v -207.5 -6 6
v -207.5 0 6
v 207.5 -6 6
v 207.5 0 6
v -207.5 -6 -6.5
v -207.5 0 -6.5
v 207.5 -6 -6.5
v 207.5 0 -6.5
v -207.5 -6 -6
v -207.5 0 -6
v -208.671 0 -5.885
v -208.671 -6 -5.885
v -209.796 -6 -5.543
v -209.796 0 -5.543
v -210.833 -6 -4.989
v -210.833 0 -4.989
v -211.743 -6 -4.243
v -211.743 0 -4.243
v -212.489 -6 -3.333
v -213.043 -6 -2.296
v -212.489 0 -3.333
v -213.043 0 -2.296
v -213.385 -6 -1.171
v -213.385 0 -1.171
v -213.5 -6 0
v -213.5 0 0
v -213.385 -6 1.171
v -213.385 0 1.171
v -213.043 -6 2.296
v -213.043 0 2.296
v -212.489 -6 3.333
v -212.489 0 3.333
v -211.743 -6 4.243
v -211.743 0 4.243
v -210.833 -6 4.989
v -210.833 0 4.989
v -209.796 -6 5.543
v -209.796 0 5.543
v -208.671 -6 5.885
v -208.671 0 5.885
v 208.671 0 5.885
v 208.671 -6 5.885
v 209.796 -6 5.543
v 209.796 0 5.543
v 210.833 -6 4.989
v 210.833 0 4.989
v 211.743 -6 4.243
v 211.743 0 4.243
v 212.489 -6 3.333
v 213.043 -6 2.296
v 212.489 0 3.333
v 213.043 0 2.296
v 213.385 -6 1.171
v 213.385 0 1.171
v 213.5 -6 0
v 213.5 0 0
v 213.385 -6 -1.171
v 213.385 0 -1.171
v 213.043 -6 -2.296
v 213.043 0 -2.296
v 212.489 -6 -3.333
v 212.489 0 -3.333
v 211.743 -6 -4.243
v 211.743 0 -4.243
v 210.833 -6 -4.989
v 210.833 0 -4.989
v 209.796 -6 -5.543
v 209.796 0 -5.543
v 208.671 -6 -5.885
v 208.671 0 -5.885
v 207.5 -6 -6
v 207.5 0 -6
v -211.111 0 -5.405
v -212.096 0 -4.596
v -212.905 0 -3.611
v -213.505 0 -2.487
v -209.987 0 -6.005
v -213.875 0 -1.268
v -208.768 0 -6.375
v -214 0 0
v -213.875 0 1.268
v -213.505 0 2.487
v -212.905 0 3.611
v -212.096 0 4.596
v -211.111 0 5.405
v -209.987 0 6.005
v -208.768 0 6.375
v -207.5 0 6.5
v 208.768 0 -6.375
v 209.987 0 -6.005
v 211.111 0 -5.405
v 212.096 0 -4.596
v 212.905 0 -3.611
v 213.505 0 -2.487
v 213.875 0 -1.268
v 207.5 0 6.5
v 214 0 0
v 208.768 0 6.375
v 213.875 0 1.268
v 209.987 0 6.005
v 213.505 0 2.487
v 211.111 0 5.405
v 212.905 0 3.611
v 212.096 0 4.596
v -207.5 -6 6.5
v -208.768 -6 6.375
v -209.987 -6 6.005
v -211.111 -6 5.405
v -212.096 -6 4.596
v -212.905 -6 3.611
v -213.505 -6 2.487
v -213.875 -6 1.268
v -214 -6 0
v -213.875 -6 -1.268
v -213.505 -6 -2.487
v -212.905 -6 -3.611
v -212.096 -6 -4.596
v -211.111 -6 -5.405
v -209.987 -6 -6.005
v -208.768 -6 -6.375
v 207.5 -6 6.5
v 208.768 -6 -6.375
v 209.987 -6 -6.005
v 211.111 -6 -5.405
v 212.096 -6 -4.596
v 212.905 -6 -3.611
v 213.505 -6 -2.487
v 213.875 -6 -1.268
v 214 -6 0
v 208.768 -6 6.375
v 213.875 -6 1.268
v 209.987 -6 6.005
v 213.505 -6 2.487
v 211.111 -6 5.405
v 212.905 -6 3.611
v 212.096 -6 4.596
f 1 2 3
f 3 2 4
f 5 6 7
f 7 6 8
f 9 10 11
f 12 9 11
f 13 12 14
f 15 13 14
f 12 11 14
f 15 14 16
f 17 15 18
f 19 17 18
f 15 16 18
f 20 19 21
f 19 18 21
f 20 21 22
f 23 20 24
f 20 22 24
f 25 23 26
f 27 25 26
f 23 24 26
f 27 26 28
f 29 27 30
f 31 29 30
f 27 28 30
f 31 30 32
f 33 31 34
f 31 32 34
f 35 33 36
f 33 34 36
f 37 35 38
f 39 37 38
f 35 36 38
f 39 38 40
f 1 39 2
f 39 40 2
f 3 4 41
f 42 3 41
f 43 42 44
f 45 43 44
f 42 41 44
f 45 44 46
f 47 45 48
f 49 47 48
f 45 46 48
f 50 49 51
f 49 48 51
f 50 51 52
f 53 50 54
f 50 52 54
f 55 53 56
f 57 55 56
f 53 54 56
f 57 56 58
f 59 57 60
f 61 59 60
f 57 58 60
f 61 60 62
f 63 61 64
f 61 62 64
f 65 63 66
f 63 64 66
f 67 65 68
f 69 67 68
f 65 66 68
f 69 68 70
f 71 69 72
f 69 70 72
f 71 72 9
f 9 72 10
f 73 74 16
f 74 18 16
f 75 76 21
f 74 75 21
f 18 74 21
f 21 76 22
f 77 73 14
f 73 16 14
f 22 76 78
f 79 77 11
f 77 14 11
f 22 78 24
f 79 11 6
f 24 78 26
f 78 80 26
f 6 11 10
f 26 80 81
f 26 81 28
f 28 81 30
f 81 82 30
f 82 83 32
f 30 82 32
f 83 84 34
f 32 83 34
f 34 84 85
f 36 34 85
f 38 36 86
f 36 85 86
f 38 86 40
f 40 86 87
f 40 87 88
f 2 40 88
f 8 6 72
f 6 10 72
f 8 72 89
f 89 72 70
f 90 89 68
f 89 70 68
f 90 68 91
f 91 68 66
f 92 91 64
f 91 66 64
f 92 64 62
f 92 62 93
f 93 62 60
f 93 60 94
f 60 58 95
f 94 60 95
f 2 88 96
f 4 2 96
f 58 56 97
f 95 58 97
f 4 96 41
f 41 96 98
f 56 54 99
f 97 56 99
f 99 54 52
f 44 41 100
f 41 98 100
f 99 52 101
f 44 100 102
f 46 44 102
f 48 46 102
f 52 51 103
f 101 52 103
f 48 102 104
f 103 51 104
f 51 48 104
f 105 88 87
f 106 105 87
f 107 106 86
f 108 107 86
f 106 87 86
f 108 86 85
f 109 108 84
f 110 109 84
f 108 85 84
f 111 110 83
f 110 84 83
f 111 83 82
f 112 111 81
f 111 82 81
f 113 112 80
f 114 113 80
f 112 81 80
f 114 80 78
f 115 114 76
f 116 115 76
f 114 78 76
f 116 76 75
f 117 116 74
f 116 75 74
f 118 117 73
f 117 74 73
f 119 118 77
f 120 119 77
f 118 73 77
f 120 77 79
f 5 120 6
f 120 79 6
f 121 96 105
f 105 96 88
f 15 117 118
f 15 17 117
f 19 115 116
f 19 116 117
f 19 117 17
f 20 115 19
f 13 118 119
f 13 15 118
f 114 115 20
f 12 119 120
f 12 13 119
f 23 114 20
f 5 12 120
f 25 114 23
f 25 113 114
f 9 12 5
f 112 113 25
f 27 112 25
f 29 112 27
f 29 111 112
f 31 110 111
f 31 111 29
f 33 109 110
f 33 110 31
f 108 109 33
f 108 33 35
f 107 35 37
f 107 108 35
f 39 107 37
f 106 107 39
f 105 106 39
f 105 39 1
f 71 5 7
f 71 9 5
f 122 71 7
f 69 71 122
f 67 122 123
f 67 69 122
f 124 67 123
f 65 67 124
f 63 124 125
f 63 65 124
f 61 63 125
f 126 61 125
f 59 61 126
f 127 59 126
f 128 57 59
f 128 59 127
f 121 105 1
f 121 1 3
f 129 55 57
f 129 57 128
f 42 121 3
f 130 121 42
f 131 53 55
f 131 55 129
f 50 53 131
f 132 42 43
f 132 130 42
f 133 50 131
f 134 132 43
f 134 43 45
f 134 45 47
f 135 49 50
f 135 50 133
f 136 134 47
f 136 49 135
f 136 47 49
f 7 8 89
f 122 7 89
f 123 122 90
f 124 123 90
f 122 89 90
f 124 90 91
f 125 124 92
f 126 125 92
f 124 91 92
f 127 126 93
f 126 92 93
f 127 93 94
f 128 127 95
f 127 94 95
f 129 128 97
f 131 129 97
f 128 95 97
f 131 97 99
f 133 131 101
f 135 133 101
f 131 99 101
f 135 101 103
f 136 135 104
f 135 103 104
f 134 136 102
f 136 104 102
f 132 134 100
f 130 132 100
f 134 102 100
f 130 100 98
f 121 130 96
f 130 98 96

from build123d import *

# Parameters (mm, degrees)
F1_DEPTH = 6


with BuildPart() as f1:
    # F0 (on Front) → F1 (new body)
    with BuildSketch(Plane.XZ):
        with BuildLine():
            Line((0, 6.5), (-207.5, 6.5))
            ThreePointArc((-207.5, 6.5), (-214, 0), (-207.5, -6.5))
            Line((-207.5, -6.5), (0, -6.5))
            Line((0, -6.5), (207.5, -6.5))
            ThreePointArc((207.5, -6.5), (214, 0), (207.5, 6.5))
            Line((207.5, 6.5), (0, 6.5))
        make_face()
        with BuildLine():
            ThreePointArc((-207.5, -6), (-213.5, 0), (-207.5, 6))
            Line((-207.5, 6), (0, 6))
            Line((0, 6), (207.5, 6))
            ThreePointArc((207.5, 6), (213.5, 0), (207.5, -6))
            Line((207.5, -6), (0, -6))
            Line((0, -6), (-207.5, -6))
        make_face(mode=Mode.SUBTRACT)
    extrude(amount=F1_DEPTH)


solid = f1.part
